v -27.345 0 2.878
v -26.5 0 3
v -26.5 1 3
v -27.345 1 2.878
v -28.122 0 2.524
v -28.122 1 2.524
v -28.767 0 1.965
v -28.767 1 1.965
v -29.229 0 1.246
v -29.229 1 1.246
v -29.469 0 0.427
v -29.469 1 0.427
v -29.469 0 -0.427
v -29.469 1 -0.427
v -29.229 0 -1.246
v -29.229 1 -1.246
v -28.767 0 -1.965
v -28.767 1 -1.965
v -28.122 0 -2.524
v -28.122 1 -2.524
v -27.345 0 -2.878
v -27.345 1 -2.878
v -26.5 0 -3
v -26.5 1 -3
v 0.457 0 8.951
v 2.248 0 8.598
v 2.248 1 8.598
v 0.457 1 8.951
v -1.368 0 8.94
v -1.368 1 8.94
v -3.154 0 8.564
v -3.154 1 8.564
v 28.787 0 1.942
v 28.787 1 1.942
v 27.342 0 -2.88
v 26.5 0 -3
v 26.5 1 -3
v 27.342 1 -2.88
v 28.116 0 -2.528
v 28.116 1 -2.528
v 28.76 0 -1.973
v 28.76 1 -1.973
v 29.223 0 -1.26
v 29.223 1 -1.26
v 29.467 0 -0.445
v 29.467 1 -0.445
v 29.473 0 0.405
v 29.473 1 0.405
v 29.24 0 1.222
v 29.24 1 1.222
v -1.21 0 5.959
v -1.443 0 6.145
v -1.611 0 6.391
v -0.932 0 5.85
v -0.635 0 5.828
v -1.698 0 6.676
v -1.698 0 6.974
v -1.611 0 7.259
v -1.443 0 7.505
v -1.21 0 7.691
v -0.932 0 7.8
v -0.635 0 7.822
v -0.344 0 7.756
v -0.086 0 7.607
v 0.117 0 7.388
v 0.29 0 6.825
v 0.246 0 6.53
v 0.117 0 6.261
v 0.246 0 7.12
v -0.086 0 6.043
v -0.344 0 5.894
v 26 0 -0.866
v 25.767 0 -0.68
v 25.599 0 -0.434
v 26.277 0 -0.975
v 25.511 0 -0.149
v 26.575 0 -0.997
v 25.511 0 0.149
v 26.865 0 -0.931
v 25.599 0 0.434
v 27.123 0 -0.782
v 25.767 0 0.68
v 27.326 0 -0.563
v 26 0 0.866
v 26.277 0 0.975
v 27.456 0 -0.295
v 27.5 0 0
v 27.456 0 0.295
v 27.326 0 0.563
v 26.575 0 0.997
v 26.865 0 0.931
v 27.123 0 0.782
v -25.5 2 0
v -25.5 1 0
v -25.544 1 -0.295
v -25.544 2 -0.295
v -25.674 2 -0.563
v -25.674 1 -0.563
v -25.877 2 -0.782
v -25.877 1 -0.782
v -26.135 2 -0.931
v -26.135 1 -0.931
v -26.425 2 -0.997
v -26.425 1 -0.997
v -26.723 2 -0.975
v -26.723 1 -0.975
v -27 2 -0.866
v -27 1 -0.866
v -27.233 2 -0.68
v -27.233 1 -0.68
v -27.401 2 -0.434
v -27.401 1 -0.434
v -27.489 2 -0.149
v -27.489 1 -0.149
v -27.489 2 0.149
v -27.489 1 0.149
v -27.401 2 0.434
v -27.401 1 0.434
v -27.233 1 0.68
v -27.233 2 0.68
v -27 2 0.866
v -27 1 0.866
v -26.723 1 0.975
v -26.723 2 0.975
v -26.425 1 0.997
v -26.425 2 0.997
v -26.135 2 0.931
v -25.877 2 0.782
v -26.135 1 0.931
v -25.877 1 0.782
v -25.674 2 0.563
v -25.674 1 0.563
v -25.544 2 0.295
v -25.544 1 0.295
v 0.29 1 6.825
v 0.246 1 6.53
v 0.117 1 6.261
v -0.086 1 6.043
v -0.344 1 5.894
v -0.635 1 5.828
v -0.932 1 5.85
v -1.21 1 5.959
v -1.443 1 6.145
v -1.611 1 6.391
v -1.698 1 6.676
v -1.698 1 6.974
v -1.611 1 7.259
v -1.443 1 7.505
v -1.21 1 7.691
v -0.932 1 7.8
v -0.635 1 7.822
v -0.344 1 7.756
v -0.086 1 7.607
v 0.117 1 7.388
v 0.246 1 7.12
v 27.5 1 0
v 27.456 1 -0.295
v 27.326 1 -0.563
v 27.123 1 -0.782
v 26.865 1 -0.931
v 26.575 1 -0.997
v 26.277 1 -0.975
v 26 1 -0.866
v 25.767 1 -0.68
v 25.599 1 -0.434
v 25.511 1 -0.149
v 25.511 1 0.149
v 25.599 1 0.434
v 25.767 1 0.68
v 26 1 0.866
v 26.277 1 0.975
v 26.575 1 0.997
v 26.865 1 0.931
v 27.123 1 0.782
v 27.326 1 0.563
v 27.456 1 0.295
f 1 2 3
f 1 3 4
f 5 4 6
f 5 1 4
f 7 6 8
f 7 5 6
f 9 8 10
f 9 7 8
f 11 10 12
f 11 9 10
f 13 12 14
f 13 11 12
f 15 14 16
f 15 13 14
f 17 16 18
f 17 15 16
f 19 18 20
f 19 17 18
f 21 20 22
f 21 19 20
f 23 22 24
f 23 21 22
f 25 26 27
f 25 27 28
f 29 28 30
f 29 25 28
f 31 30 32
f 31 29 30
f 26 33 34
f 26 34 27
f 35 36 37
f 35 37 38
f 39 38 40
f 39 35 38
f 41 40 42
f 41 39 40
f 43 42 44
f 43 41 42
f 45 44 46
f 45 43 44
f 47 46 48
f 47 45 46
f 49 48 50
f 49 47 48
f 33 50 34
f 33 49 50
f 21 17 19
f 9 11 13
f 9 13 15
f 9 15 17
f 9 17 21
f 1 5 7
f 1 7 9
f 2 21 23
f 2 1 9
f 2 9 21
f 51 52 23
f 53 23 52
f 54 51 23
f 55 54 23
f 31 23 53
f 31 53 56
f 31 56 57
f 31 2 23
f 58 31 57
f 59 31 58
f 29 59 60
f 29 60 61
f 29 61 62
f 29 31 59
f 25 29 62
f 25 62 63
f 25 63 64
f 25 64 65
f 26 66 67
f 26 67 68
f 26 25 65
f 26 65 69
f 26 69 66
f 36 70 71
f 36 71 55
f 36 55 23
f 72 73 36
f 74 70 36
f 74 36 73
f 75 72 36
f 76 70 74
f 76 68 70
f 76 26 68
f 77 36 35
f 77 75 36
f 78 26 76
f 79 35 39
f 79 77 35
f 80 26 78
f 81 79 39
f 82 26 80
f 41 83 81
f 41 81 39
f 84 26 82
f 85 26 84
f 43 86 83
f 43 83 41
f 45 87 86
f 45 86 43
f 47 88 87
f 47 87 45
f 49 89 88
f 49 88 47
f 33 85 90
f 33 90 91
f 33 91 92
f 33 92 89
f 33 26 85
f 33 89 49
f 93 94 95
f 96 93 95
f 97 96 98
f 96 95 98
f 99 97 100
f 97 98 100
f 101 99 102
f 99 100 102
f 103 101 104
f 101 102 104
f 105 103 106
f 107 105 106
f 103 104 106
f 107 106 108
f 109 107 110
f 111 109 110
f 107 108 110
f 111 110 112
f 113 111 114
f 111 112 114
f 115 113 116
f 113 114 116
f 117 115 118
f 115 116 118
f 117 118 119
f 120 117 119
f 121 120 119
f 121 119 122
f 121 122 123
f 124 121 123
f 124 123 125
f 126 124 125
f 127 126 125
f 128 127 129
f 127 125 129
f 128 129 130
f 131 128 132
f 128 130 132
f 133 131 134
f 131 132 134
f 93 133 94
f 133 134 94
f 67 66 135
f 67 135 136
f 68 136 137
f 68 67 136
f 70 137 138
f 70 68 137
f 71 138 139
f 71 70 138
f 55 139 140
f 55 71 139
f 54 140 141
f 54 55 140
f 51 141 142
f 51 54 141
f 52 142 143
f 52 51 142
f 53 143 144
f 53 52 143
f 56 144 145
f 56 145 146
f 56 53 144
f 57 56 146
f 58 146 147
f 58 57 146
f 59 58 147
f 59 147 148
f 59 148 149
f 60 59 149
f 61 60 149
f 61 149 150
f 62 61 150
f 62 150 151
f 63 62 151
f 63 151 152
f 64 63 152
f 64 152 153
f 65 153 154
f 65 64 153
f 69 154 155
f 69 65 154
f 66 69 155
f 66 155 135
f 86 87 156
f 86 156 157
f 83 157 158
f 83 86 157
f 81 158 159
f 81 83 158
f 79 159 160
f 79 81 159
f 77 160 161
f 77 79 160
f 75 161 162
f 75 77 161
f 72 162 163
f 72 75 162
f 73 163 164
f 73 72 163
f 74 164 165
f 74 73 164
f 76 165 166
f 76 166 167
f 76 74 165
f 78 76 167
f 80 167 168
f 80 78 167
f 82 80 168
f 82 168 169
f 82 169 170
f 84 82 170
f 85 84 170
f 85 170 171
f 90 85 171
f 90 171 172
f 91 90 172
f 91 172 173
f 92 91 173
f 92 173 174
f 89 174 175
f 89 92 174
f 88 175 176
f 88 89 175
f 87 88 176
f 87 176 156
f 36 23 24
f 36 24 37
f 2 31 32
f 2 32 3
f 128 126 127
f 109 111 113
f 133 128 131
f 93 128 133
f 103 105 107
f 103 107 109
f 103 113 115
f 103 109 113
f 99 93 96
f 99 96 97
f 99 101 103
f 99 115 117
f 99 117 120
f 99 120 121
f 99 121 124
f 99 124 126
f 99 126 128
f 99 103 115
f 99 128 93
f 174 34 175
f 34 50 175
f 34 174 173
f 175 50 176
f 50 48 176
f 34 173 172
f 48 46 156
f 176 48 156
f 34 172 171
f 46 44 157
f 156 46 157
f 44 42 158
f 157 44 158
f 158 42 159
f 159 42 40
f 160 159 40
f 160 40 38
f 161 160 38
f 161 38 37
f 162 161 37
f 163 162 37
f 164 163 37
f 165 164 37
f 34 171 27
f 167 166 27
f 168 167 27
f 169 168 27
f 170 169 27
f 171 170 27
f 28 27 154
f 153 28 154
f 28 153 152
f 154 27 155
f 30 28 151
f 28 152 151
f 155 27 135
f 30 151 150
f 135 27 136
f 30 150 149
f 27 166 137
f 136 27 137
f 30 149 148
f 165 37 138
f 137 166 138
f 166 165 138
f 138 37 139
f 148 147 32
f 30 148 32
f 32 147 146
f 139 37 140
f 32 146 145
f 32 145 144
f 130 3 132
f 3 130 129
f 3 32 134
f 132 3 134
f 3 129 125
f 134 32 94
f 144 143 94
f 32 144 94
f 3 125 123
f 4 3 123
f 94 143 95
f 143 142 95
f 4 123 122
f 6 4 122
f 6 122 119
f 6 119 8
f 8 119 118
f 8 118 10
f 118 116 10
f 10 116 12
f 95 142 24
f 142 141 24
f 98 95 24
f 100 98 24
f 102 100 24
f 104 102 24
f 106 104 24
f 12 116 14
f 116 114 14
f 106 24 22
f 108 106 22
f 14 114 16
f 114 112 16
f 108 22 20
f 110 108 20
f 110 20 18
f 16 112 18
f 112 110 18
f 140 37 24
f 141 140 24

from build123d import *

# Parameters (mm, degrees)
SKETCH1_R           = 1
BOSS_EXTRUDE1_DEPTH = 1
SKETCH2_R           = 1
BOSS_EXTRUDE2_DEPTH = 1
SKETCH3_R           = 1
BOSS_EXTRUDE3_DEPTH = 1


with BuildPart() as part:
    # Sketch1 → Boss-Extrude1 (new body)
    with BuildSketch(Plane(origin=(0, 0, 0), x_dir=(1, 0, 0), z_dir=(0, 1, 0))):
        with BuildLine():
            Line((-26.5, 3), (26.5, 3))
            ThreePointArc((26.5, 3), (29.222667474, 1.259794359), (28.786667416, -1.941945449))
            Line((28.786667416, -1.941945449), (2.247877744, -8.598102408))
            ThreePointArc((2.247877744, -8.598102408), (-0.45558898, -8.991146774), (-3.153897824, -8.56412735))
            Line((-3.153897824, -8.56412735), (-26.5, -3))
            ThreePointArc((-26.5, -3), (-29.5, 0), (-26.5, 3))
        make_face()
        with Locations((-26.5, 0)):
            Circle(SKETCH1_R, mode=Mode.SUBTRACT)
        with Locations((26.5, 0)):
            Circle(SKETCH1_R, mode=Mode.SUBTRACT)
        with Locations((-0.709607331, -6.824747005)):
            Circle(SKETCH1_R, mode=Mode.SUBTRACT)
    extrude(amount=BOSS_EXTRUDE1_DEPTH)



with BuildPart() as body_2:
    # Sketch2 → Boss-Extrude2 (new body)
    with BuildSketch(Plane(origin=(0, 1, 0), x_dir=(1, 0, 0), z_dir=(0, 1, 0))):
        with Locations((-26.5, 0)):
            Circle(SKETCH2_R)
    extrude(amount=BOSS_EXTRUDE2_DEPTH)


with BuildPart() as part_1:
    add(part.part)

    add(body_2.part)  # Boss-Extrude3 merges body 2
    # Sketch3 → Boss-Extrude3 (add)
    with BuildSketch(Plane.XZ):
        with Locations((-26.5, 0)):
            Circle(SKETCH3_R)
    extrude(amount=-BOSS_EXTRUDE3_DEPTH)


solid = part_1.part
